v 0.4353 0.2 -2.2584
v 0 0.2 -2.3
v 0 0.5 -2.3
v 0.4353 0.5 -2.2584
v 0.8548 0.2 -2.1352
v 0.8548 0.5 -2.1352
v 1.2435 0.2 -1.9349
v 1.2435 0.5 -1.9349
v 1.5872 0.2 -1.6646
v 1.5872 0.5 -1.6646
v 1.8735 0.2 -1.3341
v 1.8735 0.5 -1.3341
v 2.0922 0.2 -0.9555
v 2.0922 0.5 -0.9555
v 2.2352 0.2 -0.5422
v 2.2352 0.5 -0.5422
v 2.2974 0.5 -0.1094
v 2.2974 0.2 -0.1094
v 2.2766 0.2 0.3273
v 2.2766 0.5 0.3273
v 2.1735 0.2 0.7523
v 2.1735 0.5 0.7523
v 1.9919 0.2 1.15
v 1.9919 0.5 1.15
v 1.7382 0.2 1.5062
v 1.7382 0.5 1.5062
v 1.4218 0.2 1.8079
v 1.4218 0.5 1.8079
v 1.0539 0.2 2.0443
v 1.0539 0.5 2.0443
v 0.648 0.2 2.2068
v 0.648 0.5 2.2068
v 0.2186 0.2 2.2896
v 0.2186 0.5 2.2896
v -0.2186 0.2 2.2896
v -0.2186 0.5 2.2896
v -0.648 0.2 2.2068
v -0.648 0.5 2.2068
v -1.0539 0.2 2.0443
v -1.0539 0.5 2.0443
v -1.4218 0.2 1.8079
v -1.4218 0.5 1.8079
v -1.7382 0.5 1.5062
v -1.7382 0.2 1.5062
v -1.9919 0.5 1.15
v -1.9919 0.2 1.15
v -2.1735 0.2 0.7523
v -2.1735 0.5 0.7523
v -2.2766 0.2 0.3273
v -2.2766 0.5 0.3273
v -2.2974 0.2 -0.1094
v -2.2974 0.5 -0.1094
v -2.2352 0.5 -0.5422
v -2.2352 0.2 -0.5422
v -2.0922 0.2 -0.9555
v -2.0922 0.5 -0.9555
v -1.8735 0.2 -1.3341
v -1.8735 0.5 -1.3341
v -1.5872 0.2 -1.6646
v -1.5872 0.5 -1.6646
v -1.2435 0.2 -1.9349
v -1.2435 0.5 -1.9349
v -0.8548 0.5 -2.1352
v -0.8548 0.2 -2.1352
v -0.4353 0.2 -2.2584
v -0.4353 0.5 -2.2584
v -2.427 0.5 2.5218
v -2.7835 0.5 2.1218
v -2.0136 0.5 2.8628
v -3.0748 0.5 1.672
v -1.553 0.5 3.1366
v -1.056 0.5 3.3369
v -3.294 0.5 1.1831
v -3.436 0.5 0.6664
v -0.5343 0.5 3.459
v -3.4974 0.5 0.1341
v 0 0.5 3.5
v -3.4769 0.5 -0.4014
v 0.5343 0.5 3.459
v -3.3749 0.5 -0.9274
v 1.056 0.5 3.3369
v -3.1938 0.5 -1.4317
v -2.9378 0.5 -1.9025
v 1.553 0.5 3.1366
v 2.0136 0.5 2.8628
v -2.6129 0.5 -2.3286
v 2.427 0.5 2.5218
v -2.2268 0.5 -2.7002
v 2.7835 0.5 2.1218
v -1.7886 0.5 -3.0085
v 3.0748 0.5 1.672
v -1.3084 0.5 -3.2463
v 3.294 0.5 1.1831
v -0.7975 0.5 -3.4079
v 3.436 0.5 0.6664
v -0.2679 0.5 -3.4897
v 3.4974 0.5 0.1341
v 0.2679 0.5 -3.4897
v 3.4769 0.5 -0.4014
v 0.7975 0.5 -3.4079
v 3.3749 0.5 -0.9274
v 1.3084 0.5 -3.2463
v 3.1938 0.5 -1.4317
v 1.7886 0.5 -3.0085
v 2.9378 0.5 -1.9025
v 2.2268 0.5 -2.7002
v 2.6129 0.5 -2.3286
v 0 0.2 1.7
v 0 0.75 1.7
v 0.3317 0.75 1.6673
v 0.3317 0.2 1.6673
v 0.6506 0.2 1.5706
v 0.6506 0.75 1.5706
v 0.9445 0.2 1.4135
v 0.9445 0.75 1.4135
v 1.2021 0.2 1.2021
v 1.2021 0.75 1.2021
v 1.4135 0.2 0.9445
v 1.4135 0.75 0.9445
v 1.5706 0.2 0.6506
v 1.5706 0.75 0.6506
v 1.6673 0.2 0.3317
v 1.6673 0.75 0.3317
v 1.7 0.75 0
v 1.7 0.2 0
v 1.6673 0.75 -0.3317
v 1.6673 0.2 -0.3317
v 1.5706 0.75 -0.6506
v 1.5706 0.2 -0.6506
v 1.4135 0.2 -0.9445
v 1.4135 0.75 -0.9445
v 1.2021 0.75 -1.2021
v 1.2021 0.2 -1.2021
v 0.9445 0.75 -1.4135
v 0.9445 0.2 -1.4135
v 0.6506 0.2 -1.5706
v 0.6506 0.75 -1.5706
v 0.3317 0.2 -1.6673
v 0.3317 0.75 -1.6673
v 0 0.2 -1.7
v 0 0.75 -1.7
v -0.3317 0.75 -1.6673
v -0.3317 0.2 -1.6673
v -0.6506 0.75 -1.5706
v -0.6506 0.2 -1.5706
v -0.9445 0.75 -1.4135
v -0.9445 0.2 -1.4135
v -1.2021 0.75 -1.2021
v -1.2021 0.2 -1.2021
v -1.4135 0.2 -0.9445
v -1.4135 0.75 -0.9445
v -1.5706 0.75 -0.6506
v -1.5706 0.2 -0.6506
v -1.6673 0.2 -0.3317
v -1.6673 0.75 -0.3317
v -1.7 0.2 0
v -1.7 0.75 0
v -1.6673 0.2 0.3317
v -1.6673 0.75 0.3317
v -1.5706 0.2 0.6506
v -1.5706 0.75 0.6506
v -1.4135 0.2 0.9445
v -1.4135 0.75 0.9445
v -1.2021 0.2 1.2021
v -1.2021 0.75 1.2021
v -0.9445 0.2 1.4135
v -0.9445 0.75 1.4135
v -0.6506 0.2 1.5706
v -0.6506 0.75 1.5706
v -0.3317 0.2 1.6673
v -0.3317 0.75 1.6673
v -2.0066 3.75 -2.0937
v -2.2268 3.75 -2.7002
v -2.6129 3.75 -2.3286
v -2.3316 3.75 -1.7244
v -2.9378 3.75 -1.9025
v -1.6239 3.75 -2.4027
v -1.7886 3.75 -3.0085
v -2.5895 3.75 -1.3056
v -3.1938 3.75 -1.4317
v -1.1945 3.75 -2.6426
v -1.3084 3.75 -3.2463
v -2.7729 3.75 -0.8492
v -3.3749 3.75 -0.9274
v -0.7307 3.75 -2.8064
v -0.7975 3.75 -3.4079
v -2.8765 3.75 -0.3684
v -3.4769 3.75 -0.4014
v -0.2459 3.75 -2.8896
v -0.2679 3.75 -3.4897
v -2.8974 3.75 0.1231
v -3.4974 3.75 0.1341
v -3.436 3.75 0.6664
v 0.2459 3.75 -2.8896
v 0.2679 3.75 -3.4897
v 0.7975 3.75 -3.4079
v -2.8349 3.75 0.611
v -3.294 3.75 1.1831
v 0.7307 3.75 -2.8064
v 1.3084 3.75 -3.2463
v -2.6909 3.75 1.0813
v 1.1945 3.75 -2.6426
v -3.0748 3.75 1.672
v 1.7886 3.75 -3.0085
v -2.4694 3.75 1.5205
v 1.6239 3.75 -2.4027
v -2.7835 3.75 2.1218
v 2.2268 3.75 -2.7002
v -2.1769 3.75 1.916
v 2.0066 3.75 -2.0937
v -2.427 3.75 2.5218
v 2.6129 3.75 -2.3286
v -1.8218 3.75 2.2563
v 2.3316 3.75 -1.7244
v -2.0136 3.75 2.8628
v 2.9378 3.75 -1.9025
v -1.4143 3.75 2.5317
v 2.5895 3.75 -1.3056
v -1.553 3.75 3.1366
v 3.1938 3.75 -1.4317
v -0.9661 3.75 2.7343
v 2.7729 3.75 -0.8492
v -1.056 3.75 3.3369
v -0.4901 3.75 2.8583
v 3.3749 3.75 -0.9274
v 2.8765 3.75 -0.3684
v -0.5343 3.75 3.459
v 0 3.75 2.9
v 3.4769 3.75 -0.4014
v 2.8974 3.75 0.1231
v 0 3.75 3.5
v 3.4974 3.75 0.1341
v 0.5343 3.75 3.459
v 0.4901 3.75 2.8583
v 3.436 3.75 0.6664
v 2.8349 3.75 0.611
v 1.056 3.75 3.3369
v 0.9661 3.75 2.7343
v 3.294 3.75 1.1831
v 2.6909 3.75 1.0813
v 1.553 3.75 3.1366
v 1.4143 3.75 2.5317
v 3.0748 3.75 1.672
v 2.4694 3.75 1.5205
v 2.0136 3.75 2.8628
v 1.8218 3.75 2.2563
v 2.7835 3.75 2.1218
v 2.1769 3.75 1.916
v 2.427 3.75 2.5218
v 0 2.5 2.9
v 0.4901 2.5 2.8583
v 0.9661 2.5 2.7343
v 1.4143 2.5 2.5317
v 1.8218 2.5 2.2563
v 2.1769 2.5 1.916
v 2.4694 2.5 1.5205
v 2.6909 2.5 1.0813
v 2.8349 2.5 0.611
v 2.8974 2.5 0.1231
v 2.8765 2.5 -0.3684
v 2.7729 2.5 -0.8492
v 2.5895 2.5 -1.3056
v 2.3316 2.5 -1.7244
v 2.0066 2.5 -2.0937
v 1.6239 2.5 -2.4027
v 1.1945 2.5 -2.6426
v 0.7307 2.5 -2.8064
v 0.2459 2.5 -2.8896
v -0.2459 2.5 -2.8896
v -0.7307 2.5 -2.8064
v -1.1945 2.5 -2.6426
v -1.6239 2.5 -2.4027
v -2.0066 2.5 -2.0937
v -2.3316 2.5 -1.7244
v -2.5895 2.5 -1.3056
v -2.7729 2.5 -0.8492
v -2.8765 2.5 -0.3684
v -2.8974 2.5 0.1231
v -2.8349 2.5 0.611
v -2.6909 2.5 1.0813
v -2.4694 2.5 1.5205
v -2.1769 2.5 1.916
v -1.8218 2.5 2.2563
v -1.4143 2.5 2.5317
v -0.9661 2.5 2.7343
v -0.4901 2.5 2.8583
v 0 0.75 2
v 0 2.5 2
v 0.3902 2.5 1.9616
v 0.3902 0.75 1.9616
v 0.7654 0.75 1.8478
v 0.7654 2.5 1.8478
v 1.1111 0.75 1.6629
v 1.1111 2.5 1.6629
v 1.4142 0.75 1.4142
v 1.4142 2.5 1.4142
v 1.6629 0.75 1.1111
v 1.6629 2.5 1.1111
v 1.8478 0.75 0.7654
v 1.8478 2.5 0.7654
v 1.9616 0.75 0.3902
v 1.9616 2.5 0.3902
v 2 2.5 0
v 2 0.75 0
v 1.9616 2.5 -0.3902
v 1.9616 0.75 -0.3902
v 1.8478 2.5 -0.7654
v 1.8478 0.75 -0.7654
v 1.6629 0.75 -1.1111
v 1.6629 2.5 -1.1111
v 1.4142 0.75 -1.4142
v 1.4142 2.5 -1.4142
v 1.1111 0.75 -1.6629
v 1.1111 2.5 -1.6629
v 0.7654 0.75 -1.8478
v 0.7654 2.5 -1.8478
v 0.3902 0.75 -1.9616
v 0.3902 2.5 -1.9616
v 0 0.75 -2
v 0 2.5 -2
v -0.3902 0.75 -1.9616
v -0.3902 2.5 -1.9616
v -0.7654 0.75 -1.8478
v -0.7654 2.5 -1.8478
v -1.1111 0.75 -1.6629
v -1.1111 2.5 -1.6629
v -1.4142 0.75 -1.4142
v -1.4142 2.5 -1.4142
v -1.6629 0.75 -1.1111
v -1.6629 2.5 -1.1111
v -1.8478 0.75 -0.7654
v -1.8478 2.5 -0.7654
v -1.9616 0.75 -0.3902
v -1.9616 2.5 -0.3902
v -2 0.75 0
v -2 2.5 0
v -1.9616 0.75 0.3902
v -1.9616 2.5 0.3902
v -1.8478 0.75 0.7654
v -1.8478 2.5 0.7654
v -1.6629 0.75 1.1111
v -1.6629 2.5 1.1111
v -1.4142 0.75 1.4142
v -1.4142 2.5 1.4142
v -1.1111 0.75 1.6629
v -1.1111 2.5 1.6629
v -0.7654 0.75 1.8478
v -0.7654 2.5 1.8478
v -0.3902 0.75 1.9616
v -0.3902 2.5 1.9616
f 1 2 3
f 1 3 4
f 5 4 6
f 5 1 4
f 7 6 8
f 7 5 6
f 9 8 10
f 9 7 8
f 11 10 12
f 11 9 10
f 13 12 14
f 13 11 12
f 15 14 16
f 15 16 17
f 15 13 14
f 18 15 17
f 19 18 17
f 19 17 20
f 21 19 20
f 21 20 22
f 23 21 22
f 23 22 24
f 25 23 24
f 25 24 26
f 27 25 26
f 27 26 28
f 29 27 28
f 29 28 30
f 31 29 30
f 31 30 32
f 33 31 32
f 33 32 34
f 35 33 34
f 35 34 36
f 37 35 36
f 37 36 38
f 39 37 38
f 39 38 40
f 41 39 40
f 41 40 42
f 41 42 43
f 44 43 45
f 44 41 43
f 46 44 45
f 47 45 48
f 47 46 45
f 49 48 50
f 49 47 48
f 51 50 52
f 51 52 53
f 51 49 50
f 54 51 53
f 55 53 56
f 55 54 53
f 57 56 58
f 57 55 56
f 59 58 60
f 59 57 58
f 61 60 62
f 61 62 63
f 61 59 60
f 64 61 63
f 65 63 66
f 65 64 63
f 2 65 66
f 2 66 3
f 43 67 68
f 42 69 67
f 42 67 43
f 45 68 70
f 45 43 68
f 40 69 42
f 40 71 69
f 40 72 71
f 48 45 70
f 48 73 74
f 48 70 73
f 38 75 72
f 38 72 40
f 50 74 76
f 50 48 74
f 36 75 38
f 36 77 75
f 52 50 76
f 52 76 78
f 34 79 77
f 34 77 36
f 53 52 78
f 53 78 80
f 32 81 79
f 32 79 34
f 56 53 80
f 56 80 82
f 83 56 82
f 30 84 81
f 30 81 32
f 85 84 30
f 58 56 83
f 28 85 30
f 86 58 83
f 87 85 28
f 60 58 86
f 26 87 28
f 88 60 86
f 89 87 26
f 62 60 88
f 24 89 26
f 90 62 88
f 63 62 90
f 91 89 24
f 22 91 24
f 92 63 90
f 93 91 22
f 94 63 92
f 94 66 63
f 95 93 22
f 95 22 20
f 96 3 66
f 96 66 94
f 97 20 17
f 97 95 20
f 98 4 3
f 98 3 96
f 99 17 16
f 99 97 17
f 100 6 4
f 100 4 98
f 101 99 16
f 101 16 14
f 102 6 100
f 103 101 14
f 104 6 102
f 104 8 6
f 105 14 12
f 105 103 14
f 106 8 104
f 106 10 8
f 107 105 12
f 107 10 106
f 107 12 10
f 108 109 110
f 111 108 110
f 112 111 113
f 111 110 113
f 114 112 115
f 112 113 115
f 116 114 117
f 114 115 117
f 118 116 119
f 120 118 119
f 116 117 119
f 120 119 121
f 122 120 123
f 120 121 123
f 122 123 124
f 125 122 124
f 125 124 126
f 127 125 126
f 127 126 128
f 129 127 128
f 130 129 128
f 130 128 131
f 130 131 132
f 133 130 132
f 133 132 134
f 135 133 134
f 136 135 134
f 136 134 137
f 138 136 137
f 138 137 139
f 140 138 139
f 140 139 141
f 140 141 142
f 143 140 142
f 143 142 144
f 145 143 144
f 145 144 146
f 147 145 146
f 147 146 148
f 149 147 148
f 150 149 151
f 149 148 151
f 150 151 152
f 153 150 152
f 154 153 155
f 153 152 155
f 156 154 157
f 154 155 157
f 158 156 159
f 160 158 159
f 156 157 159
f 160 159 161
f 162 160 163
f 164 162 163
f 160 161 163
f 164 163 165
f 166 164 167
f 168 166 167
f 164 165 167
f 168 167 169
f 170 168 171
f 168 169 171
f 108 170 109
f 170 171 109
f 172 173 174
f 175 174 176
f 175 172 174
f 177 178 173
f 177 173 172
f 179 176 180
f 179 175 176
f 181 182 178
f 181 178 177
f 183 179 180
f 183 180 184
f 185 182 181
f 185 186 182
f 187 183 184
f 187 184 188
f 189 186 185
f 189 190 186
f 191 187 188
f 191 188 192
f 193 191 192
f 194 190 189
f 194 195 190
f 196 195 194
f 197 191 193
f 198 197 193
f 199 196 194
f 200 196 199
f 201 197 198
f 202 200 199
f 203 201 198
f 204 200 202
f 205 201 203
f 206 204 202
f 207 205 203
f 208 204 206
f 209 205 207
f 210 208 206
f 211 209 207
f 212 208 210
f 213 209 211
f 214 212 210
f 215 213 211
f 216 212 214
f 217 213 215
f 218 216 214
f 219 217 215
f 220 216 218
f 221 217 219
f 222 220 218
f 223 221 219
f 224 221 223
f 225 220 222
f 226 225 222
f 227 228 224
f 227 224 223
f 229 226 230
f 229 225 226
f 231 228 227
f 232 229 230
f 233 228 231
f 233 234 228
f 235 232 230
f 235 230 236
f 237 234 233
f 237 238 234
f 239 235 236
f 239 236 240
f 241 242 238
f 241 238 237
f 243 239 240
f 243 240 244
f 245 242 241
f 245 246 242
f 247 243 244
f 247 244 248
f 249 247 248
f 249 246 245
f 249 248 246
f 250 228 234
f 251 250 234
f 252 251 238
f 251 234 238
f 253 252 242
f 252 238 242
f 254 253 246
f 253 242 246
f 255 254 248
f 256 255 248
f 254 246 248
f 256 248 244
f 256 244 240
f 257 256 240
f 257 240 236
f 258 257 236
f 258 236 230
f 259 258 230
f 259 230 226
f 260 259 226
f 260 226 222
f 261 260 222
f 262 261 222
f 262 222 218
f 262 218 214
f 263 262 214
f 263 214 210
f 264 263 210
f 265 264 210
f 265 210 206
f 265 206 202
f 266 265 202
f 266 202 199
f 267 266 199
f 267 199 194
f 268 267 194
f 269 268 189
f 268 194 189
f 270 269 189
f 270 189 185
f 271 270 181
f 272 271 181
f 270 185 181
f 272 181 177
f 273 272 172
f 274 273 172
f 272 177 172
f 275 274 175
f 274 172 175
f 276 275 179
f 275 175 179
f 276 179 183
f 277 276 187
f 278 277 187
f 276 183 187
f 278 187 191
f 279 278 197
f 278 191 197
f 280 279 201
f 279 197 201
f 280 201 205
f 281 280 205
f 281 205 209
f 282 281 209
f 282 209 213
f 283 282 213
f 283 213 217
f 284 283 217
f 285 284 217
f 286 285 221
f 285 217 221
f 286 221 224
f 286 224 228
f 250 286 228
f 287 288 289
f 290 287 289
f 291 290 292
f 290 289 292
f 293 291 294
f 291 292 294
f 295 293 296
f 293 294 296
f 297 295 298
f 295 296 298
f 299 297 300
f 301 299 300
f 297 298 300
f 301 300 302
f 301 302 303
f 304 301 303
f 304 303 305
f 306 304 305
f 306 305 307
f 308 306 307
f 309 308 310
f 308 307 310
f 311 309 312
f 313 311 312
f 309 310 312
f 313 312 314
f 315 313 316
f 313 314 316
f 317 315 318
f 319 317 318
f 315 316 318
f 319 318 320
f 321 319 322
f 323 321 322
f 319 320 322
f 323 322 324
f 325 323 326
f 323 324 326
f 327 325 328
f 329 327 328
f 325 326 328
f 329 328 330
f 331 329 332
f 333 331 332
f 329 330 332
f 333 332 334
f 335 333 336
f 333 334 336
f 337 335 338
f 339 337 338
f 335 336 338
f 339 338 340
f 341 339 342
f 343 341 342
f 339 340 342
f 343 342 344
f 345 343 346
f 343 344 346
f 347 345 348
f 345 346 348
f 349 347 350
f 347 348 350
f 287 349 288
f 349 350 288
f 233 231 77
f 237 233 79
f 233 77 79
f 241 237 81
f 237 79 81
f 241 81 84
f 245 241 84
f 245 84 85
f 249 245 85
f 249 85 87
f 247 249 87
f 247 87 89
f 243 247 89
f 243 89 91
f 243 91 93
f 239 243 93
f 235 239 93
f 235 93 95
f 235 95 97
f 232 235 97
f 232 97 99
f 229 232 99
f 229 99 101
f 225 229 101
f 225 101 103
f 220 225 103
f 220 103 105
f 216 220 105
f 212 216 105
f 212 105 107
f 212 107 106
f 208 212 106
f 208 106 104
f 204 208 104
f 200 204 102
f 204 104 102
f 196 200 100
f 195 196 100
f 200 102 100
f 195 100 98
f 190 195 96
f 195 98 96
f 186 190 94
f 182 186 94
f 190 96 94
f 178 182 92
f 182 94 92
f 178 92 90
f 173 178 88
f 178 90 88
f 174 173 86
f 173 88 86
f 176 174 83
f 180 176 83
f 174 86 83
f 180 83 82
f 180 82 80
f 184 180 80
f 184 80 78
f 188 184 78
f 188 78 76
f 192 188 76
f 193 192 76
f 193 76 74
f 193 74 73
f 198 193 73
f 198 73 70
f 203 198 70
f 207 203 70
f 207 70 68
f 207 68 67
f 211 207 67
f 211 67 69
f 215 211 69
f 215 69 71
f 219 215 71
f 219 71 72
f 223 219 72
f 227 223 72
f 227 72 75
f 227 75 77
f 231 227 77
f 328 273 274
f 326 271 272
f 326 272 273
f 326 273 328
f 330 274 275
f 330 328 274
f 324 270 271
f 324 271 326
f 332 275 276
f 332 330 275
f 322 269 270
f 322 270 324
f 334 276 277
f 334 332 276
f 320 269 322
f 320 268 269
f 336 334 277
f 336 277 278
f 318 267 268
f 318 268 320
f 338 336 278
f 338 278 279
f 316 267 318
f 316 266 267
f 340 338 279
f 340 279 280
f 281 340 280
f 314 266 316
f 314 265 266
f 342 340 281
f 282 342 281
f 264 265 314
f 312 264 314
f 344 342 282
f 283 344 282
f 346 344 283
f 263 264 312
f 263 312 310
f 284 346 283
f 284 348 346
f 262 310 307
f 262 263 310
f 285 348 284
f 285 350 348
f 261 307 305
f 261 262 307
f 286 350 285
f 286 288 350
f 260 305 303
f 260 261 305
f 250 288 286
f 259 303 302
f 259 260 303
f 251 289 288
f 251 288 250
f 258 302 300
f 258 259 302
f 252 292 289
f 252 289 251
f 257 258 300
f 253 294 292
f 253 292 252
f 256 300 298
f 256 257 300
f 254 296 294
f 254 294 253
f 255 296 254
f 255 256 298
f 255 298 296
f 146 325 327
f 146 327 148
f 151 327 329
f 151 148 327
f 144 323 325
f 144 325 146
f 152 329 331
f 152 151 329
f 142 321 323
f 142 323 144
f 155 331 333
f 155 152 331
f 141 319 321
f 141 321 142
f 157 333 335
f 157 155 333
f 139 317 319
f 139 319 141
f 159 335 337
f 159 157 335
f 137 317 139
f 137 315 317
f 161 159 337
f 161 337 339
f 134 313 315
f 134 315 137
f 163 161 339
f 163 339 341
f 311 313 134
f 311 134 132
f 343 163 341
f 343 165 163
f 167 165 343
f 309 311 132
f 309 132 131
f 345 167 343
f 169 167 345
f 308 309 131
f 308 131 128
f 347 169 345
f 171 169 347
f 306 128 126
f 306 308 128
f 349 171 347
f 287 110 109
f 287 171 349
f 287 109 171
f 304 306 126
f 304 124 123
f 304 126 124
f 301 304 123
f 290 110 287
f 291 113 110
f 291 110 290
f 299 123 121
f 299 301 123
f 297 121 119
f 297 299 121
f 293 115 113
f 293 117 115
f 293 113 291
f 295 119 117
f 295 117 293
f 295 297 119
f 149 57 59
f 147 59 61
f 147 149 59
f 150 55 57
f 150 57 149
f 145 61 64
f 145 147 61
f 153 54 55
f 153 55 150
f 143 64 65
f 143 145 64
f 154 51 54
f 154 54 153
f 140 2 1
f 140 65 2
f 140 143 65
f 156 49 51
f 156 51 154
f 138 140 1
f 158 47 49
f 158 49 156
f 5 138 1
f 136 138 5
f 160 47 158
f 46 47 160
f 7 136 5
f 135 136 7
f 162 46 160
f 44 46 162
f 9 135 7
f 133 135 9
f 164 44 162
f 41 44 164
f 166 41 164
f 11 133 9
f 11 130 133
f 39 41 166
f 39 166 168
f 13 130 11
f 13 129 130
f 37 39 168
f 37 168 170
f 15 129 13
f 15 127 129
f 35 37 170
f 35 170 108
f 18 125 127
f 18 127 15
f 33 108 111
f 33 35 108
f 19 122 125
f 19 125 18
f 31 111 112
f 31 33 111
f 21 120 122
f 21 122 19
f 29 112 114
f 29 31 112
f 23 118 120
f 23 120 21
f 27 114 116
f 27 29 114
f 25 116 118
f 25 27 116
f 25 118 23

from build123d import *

# Parameters (mm, degrees)
ESQUISSE3_R               = 3.5
SHAPE_DEPTH               = 3.75
ESQUISSE4_R               = 2.9
CUT_EXTRUDE_5_4D_DEPTH    = 3
ESQUISSE5_R               = 1.7
CUT_EXTRUDE_3D_DEPTH      = 3
ESQUISSE6_R               = 3.5
ESQUISSE6_R_2             = 2.3
ENL_V_MAT_EXTRU_2_DEPTH   = 0.5
BOSS_EXTRU_1_START        = 1.75
ESQUISSE9_R               = 2.9
ESQUISSE9_R_2             = 2
BOSS_EXTRU_1_DEPTH        = 1.75
ESQUISSE10_R              = 2.619168903
ERRORPRINTERREMOVER_DEPTH = 0.2


with BuildPart() as part:
    # Esquisse3 → Shape (new body)
    with BuildSketch(Plane(origin=(0, 0, 0), x_dir=(1, 0, 0), z_dir=(0, 1, 0))):
        with Locations(Location((0, 0, 0), (0, 0, 270))):
            Circle(ESQUISSE3_R)
    extrude(amount=SHAPE_DEPTH)

    # Esquisse4 → 5_4D (cut)
    with BuildSketch(Plane(origin=(0, 3.75, 0), x_dir=(1, 0, 0), z_dir=(0, 1, 0))):
        with Locations(Location((0, 0, 0), (0, 0, 270))):
            Circle(ESQUISSE4_R)
    extrude(amount=-CUT_EXTRUDE_5_4D_DEPTH, mode=Mode.SUBTRACT)

    # Esquisse5 → 3D (cut)
    with BuildSketch(Plane(origin=(0, 0.75, 0), x_dir=(1, 0, 0), z_dir=(0, 1, 0))):
        with Locations(Location((0, 0, 0), (0, 0, 270))):
            Circle(ESQUISSE5_R)
    extrude(amount=-CUT_EXTRUDE_3D_DEPTH, mode=Mode.SUBTRACT)

    # Esquisse6 → Enlèv. mat.-Extru.2 (cut)
    with BuildSketch(Plane.XZ):
        with Locations(Location((0, 0, 0), (0, 0, 270))):
            Circle(ESQUISSE6_R)
        with Locations(Location((0, 0, 0), (0, 0, 270))):
            Circle(ESQUISSE6_R_2, mode=Mode.SUBTRACT)
    extrude(amount=-ENL_V_MAT_EXTRU_2_DEPTH, mode=Mode.SUBTRACT)

    # Esquisse9 → Boss.-Extru.1 (add)
    with BuildSketch(Plane(origin=(0, 0.75, 0), x_dir=(1, 0, 0), z_dir=(0, 1, 0)).offset(BOSS_EXTRU_1_START)):
        with Locations(Location((0, 0, 0), (0, 0, 270))):
            Circle(ESQUISSE9_R)
        with Locations(Location((0, 0, 0), (0, 0, 270))):
            Circle(ESQUISSE9_R_2, mode=Mode.SUBTRACT)
    extrude(amount=-BOSS_EXTRU_1_DEPTH)

    # Esquisse10 → ErrorPrinterRemover (cut)
    with BuildSketch(Plane.XZ):
        Circle(ESQUISSE10_R)
    extrude(amount=-ERRORPRINTERREMOVER_DEPTH, mode=Mode.SUBTRACT)


solid = part.part
